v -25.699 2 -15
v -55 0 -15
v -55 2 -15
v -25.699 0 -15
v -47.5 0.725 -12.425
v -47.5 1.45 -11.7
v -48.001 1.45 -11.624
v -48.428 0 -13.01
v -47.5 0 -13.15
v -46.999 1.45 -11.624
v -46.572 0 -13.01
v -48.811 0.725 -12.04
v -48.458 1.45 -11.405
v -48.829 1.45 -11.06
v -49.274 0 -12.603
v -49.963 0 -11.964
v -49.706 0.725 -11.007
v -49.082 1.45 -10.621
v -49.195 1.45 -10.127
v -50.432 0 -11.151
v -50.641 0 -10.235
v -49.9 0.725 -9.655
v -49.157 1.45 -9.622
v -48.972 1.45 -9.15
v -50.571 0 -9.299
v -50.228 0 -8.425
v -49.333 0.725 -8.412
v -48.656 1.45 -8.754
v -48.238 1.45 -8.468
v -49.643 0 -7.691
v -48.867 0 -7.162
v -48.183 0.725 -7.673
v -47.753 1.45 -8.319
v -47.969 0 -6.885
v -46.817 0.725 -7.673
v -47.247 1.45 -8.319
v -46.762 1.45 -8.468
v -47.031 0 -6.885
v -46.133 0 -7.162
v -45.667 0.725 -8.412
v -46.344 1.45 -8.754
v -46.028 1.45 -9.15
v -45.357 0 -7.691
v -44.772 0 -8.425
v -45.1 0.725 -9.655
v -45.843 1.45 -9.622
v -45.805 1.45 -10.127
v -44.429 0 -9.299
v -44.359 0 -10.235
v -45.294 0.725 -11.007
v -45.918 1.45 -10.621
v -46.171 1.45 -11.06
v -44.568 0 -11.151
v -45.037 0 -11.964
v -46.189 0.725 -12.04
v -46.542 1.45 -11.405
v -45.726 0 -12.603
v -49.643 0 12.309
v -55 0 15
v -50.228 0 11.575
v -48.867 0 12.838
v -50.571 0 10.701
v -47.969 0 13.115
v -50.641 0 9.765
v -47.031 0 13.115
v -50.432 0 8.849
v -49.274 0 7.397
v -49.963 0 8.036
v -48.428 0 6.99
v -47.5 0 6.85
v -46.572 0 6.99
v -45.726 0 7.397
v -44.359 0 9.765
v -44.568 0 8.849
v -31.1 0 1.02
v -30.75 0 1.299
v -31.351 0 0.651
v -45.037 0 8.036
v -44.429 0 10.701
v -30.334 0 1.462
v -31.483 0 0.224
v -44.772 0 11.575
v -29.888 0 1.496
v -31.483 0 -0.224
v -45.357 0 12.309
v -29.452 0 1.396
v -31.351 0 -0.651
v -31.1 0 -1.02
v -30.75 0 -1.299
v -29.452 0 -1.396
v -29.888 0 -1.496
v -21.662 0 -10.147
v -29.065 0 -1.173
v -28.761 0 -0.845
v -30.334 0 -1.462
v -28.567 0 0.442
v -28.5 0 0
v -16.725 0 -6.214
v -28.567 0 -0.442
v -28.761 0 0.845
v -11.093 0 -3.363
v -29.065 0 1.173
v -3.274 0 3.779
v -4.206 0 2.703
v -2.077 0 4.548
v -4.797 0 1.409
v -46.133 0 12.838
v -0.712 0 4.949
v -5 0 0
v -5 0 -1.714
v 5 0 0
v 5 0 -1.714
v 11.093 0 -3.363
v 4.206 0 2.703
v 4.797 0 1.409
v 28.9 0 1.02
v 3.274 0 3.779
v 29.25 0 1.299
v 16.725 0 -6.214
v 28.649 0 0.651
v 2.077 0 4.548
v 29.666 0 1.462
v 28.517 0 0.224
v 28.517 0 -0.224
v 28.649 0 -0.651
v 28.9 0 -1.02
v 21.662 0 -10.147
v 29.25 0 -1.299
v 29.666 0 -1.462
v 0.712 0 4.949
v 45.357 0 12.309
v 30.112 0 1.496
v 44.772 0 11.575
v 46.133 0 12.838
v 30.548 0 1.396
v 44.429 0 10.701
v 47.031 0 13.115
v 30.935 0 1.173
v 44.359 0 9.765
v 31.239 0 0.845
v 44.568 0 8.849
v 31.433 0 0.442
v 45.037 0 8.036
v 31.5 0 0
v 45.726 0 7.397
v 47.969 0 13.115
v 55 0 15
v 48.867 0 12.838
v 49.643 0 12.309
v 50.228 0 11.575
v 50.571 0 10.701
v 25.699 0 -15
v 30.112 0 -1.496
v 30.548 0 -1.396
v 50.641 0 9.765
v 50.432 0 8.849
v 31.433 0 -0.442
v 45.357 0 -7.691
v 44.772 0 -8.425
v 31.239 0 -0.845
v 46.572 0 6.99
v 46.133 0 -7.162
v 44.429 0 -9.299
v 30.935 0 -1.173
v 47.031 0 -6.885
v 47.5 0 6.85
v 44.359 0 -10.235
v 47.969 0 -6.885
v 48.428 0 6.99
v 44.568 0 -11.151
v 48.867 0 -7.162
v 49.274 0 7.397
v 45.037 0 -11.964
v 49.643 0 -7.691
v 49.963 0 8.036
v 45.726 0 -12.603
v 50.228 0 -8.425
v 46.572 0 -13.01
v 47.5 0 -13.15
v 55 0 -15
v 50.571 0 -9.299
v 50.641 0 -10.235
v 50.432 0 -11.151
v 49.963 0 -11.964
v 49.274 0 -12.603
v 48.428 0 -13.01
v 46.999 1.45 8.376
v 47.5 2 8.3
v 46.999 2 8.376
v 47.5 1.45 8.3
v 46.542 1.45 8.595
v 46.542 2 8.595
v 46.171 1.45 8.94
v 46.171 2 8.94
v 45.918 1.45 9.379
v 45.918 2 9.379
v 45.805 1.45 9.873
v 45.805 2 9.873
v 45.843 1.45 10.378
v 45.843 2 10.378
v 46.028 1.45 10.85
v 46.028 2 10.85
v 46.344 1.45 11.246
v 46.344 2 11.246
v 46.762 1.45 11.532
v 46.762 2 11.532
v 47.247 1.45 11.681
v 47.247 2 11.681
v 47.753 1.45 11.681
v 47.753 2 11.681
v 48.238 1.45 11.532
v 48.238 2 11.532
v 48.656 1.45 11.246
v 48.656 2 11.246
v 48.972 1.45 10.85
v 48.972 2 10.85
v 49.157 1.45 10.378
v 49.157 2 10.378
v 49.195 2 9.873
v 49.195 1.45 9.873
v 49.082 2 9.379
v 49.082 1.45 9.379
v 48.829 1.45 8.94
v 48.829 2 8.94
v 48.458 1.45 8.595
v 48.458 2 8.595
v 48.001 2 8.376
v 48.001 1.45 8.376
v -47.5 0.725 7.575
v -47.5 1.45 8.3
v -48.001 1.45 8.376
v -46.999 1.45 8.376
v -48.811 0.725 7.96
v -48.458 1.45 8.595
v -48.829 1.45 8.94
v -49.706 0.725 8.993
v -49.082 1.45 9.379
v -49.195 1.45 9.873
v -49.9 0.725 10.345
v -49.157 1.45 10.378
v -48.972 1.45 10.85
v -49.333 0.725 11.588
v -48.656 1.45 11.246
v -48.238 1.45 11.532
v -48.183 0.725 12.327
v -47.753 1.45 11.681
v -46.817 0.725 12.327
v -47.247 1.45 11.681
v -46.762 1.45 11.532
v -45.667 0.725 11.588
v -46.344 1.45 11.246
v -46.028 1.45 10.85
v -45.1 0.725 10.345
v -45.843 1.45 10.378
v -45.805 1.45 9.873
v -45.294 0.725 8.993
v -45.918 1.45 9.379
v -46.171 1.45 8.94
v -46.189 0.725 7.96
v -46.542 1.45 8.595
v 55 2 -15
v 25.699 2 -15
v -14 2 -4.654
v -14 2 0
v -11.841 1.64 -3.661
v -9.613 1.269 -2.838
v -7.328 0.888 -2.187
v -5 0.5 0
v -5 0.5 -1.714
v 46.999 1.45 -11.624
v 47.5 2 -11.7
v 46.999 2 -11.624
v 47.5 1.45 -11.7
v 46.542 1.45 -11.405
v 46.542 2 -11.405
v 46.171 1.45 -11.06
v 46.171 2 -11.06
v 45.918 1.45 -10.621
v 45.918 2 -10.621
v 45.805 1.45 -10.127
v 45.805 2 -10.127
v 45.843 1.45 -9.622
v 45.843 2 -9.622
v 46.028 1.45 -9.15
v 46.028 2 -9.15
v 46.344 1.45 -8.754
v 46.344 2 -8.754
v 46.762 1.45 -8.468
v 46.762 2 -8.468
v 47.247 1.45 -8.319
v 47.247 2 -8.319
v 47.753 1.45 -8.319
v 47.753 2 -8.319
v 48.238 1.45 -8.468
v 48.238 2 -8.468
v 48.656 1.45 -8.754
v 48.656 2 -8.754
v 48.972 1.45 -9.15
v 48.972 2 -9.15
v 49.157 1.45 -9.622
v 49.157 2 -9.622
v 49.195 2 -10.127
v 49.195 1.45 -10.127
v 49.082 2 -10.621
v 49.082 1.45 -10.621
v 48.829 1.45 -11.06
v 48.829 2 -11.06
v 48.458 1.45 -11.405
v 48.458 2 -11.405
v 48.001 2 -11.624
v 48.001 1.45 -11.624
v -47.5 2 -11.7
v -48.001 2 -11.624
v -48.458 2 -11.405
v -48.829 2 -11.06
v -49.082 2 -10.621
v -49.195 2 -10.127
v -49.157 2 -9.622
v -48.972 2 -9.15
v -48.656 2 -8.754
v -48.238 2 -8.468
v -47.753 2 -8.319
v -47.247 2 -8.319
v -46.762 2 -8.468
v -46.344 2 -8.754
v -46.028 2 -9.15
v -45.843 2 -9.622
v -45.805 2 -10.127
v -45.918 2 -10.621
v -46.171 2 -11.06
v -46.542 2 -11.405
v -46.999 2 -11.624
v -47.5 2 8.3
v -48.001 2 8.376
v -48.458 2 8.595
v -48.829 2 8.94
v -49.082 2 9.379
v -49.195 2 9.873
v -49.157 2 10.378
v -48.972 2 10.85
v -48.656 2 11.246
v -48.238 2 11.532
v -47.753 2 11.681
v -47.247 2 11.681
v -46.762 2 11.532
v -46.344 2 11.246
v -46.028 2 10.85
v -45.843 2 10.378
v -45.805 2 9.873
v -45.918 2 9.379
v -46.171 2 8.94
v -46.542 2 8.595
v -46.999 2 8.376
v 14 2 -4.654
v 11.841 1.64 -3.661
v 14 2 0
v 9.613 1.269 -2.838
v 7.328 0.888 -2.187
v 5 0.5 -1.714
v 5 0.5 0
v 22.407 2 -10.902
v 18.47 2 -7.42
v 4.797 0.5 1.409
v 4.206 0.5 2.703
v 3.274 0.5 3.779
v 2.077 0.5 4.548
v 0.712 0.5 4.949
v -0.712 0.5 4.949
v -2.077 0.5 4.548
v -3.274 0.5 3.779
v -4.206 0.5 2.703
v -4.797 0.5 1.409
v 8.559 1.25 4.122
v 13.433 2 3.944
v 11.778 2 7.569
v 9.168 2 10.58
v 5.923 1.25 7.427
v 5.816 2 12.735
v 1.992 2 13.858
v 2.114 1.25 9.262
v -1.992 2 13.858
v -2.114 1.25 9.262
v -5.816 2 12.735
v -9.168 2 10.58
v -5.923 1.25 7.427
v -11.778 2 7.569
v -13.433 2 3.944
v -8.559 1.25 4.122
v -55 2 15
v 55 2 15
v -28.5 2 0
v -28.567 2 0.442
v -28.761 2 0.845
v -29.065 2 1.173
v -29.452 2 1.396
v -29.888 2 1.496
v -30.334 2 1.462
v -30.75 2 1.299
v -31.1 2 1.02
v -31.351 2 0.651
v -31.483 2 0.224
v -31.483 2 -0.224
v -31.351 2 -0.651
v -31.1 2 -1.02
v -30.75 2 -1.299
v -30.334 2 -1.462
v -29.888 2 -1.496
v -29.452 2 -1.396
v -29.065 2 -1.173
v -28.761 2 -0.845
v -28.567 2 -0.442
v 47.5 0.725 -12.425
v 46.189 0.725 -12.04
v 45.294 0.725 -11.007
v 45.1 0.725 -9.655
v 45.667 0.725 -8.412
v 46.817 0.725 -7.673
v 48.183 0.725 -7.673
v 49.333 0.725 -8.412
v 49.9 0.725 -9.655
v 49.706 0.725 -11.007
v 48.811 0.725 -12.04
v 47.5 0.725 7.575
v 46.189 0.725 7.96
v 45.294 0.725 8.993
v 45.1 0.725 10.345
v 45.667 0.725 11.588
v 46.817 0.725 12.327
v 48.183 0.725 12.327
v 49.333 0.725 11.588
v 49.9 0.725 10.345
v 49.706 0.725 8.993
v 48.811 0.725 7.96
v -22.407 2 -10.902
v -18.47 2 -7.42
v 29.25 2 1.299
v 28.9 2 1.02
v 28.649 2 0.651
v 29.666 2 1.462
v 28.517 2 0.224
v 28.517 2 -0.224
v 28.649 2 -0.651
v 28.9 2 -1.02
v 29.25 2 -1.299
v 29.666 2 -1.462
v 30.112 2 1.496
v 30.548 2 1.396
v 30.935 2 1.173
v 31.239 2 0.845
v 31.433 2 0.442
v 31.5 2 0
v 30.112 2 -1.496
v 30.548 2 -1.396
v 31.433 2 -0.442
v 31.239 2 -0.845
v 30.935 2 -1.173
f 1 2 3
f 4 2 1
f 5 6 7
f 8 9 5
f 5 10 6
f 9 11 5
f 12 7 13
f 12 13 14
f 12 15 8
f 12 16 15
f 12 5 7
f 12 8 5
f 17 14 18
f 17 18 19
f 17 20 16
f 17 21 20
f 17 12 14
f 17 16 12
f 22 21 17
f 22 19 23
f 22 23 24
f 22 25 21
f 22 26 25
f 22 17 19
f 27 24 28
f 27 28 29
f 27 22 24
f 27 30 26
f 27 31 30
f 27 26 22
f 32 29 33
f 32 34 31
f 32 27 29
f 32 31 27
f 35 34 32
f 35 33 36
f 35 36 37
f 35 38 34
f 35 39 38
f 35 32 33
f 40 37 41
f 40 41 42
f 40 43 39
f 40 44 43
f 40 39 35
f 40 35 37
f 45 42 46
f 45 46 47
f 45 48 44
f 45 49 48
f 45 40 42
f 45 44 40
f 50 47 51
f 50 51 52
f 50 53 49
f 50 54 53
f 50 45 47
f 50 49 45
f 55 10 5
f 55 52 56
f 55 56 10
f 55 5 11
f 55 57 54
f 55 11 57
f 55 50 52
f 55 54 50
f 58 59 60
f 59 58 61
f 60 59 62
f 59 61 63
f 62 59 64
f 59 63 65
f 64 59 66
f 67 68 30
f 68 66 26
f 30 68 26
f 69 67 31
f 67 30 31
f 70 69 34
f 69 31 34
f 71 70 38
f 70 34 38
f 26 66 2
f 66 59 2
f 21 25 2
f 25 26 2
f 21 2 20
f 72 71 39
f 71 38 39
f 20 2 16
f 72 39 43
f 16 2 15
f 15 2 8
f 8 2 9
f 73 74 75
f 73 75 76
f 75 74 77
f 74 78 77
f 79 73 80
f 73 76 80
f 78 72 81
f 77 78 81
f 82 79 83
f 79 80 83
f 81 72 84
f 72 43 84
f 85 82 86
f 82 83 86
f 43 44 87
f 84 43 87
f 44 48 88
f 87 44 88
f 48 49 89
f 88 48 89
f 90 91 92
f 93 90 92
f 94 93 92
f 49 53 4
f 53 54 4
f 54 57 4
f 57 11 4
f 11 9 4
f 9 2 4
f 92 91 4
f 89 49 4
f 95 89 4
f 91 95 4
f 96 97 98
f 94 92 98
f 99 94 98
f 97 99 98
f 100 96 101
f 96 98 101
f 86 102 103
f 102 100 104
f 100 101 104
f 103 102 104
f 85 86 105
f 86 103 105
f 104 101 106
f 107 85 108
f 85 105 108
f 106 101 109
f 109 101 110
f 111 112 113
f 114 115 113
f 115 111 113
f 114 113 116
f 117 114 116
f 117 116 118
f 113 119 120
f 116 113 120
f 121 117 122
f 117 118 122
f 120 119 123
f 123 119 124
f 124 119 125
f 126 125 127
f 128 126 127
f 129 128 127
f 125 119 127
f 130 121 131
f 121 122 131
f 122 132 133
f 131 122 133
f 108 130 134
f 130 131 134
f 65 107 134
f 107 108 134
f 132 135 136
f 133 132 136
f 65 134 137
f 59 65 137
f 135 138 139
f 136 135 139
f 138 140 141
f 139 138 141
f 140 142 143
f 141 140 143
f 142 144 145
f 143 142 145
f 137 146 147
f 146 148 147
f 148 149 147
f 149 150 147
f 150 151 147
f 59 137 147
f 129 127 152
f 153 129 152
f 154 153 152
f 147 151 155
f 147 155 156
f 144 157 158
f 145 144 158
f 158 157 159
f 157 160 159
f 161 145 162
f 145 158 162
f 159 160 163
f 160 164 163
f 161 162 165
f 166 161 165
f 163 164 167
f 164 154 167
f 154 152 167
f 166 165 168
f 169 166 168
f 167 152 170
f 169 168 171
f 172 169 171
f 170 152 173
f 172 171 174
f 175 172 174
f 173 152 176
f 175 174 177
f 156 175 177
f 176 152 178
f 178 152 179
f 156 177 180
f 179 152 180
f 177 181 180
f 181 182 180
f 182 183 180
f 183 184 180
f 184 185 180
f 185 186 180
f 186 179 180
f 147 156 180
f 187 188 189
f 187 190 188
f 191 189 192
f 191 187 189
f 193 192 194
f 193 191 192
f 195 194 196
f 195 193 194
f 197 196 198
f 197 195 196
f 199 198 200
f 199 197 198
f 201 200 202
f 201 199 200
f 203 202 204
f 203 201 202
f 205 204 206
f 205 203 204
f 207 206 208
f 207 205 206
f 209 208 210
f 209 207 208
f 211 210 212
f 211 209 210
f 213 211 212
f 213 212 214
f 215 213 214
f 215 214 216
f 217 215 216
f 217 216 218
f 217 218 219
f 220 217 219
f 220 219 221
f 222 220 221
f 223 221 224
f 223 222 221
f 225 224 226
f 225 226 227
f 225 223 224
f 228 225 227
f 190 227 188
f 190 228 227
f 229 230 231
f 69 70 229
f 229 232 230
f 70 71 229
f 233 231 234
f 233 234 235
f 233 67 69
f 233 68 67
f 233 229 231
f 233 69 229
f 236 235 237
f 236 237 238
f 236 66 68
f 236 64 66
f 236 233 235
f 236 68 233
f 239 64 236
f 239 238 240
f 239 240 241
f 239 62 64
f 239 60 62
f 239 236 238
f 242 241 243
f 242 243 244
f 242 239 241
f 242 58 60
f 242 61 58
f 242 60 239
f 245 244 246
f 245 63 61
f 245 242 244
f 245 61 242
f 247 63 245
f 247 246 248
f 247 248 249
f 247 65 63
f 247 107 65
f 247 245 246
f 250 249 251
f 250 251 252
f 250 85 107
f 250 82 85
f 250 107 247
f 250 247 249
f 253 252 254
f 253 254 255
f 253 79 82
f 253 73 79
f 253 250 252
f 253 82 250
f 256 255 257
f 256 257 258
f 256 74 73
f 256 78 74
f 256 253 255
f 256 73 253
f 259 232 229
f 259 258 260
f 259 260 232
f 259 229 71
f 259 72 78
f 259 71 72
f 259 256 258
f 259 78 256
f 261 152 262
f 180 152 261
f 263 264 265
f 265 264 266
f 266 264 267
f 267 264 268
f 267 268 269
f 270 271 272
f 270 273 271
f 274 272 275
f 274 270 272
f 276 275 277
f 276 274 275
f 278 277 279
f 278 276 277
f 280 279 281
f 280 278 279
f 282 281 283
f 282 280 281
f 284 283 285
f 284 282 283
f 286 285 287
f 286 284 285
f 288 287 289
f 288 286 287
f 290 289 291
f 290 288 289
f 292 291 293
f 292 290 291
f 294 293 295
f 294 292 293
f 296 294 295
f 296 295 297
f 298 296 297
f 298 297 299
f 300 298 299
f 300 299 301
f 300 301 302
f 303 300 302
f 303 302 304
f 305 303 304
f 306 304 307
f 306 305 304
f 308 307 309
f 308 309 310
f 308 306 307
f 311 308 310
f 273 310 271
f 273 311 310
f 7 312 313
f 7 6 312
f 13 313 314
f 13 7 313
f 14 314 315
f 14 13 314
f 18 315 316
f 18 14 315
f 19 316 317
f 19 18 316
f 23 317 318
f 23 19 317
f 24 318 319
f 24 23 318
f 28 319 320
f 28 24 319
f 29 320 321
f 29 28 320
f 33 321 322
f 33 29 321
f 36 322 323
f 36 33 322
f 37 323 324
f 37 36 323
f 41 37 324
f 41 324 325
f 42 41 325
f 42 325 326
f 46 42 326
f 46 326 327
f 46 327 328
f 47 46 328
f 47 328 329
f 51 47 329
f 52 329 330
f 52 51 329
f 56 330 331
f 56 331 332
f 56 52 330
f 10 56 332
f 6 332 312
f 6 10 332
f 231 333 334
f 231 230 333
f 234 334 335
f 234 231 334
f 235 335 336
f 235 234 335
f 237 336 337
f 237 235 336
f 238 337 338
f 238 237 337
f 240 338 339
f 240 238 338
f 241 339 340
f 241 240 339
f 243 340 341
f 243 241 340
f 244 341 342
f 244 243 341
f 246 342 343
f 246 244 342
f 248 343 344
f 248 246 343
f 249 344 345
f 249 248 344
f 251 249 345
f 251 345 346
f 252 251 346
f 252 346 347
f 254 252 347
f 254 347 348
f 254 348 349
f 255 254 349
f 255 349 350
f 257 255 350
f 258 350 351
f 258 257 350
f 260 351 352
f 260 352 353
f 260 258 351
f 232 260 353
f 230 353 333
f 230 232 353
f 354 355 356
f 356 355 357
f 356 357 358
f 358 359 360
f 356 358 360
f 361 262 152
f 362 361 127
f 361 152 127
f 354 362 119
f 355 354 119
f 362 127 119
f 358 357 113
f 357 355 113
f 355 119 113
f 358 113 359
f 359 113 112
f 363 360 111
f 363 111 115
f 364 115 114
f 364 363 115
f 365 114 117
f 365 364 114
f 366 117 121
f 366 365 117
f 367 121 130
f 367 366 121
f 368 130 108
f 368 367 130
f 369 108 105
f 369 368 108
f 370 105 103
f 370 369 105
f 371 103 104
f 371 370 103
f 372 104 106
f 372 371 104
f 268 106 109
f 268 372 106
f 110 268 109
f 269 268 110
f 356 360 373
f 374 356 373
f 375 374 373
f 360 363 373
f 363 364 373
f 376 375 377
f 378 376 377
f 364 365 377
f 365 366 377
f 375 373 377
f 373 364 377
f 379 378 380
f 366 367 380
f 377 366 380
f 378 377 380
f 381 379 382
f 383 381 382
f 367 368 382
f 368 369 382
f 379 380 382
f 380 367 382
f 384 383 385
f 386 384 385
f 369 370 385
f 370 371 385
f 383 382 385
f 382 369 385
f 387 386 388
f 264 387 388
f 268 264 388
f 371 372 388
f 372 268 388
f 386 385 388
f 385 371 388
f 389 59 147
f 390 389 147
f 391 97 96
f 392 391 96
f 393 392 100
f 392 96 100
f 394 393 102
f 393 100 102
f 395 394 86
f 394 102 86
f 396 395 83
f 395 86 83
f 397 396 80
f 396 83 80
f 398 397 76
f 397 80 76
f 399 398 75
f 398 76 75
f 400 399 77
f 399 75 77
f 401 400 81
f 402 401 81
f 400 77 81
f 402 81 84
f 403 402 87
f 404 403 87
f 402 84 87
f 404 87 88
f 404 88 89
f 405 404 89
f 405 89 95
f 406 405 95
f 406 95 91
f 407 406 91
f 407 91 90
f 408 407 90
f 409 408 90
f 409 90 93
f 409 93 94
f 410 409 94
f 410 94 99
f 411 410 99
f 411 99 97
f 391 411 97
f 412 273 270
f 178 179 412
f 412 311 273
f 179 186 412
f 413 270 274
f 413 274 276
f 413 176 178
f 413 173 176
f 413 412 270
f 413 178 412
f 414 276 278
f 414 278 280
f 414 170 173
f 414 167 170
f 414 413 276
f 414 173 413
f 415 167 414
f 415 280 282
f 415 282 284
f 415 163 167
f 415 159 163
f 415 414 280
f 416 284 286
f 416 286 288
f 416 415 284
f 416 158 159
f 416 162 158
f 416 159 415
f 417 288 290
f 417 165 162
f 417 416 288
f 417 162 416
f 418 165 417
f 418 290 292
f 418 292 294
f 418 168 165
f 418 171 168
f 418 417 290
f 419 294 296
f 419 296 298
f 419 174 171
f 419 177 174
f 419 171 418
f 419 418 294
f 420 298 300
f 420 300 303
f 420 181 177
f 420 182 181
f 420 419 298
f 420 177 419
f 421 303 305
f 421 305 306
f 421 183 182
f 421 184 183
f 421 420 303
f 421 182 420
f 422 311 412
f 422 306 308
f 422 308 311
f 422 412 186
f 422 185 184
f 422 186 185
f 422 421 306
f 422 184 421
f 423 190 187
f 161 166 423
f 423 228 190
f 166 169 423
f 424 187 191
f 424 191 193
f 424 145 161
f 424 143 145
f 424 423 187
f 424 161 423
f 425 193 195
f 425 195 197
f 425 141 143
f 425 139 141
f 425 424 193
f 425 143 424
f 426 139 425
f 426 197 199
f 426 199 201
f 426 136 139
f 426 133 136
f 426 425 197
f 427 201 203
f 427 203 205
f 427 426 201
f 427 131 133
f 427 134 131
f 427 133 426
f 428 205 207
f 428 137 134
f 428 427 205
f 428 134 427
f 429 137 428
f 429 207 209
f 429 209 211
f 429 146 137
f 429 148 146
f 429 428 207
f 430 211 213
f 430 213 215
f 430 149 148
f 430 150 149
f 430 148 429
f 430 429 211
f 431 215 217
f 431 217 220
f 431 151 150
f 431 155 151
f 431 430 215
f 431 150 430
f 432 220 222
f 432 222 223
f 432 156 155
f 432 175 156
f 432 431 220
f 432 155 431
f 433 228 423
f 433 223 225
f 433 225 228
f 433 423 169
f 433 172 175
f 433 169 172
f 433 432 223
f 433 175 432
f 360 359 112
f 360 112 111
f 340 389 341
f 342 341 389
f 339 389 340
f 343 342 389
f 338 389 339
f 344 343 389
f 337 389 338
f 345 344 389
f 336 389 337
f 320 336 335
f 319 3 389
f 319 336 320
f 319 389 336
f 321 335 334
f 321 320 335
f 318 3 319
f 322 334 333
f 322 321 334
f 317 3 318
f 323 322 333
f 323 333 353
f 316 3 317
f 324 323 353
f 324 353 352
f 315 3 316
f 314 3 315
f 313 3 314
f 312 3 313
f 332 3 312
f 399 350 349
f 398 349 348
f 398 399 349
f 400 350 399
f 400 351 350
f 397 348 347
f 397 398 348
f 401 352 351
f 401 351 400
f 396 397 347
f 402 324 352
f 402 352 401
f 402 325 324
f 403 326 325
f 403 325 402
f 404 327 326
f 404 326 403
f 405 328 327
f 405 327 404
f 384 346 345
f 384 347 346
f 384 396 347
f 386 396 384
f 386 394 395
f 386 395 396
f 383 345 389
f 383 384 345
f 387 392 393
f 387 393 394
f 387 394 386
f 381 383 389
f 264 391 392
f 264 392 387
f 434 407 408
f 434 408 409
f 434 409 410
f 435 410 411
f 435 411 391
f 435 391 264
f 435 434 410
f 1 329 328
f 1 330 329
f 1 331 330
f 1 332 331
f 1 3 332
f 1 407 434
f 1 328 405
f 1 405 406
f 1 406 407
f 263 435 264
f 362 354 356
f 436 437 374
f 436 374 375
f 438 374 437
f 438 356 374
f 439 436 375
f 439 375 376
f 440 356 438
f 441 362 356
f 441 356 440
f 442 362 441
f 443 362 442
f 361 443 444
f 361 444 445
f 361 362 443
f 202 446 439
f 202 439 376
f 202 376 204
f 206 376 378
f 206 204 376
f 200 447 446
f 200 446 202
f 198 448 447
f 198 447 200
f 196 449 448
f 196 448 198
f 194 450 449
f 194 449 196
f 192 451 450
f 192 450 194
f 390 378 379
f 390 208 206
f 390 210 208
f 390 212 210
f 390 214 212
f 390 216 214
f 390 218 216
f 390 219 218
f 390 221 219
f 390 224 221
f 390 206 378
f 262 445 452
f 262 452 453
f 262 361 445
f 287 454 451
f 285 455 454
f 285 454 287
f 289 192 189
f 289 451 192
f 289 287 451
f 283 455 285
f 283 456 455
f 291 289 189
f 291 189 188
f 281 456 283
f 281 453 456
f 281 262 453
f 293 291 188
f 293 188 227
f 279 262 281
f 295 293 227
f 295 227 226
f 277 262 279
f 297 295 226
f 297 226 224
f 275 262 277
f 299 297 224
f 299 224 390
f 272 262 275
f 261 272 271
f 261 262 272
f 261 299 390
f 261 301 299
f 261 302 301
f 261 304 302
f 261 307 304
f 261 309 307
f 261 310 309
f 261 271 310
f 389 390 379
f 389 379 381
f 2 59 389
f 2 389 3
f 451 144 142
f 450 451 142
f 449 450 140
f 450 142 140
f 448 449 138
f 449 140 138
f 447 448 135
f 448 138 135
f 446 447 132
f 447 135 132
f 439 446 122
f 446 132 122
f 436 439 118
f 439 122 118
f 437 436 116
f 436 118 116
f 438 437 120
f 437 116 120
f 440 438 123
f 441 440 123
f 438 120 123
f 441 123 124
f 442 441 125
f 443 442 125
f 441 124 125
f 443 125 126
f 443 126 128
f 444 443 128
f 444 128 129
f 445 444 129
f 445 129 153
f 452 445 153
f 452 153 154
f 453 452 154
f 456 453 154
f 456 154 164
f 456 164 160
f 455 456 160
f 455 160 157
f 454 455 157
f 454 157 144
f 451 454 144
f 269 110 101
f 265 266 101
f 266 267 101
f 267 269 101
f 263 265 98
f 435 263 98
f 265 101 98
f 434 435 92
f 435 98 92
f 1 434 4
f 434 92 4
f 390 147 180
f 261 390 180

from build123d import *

# Parameters (mm, degrees)
SKETCH1_W                                    = 110
SKETCH1_H                                    = 30
EXTRUDE1_DEPTH                               = 2
CUT_EXTRUDE1_DEPTH                           = 3
CHAMFER1_SIZE                                = 9
CHAMFER1_SIZE2                               = 1.5
CSK_FOR_M3_COUNTERSUNK_RAISED_HEAD_S_2_COUNT = 2
CSK_FOR_M3_COUNTERSUNK_RAISED_HEAD_S_2_PITCH = 95
CSK_FOR_M3_COUNTERSUNK_RAISED_HEAD_S_3_COUNT = 2
CSK_FOR_M3_COUNTERSUNK_RAISED_HEAD_S_3_PITCH = 97.082439195
CSK_FOR_M3_COUNTERSUNK_RAISED_HEAD_S_4_COUNT = 2
CSK_FOR_M3_COUNTERSUNK_RAISED_HEAD_S_4_PITCH = 20
M3_TAPPED_HOLE1_D                            = 3
SKETCH13_R                                   = 30.96323942
CUT_EXTRUDE2_DEPTH                           = 3


with BuildPart() as part:
    # Sketch1 → Extrude1 (new body)
    with BuildSketch(Plane(origin=(0, 0, 0), x_dir=(1, 0, 0), z_dir=(0, 1, 0))):
        Rectangle(SKETCH1_W, SKETCH1_H)
    extrude(amount=EXTRUDE1_DEPTH)

    # Sketch2 → Cut-Extrude1 (cut, through all)
    with BuildSketch(Plane(origin=(0, 2, 0), x_dir=(-1, 0, 0), z_dir=(0, 1, 0))):
        with BuildLine():
            Line((5, 0), (5, -15))
            Line((5, -15), (-5, -15))
            Line((-5, -15), (-5, 0))
            ThreePointArc((-5, 0), (0, 5), (5, 0))
        make_face()
    extrude(amount=-CUT_EXTRUDE1_DEPTH, mode=Mode.SUBTRACT)

    # Chamfer1
    chamfer1_edges = [part.edges().sort_by_distance(p)[0] for p in [
        (0, 2, 5),
        (5, 2, -7.5),
        (-5, 2, -7.5),
    ]]
    chamfer1_side = [part.faces().sort_by_distance(p)[0] for p in [
        (-53.859824575, 2, 0),
    ]]
    chamfer(chamfer1_edges, length=CHAMFER1_SIZE, length2=CHAMFER1_SIZE2, reference=chamfer1_side[0])

    # Sketch8 → CSK for M3 Countersunk Raised Head Screw1 (revolve, cut)
    with BuildSketch(Plane(origin=(47.5, 0, -10), x_dir=(0, 0, -1), z_dir=(1, 0, 0))):
        Polygon((0, 0), (0, 2), (1.7, 2), (1.7, 1.45), (3.15, 0), align=None)
    csk_for_m3_countersunk_raised_head_screw = revolve(axis=Axis((47.5, -6.35, -10), (0, 1, 0)), mode=Mode.SUBTRACT)

    # CSK for M3 Countersunk Raised Head S 2: CSK for M3 Countersunk Raised Head Screw1 ×2
    with Locations(*[(-i * CSK_FOR_M3_COUNTERSUNK_RAISED_HEAD_S_2_PITCH, 0, 0) for i in range(1, CSK_FOR_M3_COUNTERSUNK_RAISED_HEAD_S_2_COUNT)]):
        add(csk_for_m3_countersunk_raised_head_screw, mode=Mode.SUBTRACT)

    # CSK for M3 Countersunk Raised Head S 3: CSK for M3 Countersunk Raised Head Screw1 ×2
    with Locations(*[Vector(-0.978549785, 0, 0.206010481) * (i * CSK_FOR_M3_COUNTERSUNK_RAISED_HEAD_S_3_PITCH) for i in range(1, CSK_FOR_M3_COUNTERSUNK_RAISED_HEAD_S_3_COUNT)]):
        add(csk_for_m3_countersunk_raised_head_screw, mode=Mode.SUBTRACT)

    # CSK for M3 Countersunk Raised Head S 4: CSK for M3 Countersunk Raised Head Screw1 ×2
    with Locations(*[(0, 0, i * CSK_FOR_M3_COUNTERSUNK_RAISED_HEAD_S_4_PITCH) for i in range(1, CSK_FOR_M3_COUNTERSUNK_RAISED_HEAD_S_4_COUNT)]):
        add(csk_for_m3_countersunk_raised_head_screw, mode=Mode.SUBTRACT)

    # M3 Tapped Hole1 (through all)
    with Locations(Plane(origin=(0, 2, 0), x_dir=(-1, 0, 0), z_dir=(0, 1, 0))):
        with Locations((-30, 0), (30, 0)):
            Hole(M3_TAPPED_HOLE1_D / 2)

    # Sketch13 → Cut-Extrude2 (cut, through all)
    with BuildSketch(Plane.XZ):
        with Locations((0, -32.270962356)):
            Circle(SKETCH13_R)
    extrude(amount=-CUT_EXTRUDE2_DEPTH, mode=Mode.SUBTRACT)


solid = part.part
